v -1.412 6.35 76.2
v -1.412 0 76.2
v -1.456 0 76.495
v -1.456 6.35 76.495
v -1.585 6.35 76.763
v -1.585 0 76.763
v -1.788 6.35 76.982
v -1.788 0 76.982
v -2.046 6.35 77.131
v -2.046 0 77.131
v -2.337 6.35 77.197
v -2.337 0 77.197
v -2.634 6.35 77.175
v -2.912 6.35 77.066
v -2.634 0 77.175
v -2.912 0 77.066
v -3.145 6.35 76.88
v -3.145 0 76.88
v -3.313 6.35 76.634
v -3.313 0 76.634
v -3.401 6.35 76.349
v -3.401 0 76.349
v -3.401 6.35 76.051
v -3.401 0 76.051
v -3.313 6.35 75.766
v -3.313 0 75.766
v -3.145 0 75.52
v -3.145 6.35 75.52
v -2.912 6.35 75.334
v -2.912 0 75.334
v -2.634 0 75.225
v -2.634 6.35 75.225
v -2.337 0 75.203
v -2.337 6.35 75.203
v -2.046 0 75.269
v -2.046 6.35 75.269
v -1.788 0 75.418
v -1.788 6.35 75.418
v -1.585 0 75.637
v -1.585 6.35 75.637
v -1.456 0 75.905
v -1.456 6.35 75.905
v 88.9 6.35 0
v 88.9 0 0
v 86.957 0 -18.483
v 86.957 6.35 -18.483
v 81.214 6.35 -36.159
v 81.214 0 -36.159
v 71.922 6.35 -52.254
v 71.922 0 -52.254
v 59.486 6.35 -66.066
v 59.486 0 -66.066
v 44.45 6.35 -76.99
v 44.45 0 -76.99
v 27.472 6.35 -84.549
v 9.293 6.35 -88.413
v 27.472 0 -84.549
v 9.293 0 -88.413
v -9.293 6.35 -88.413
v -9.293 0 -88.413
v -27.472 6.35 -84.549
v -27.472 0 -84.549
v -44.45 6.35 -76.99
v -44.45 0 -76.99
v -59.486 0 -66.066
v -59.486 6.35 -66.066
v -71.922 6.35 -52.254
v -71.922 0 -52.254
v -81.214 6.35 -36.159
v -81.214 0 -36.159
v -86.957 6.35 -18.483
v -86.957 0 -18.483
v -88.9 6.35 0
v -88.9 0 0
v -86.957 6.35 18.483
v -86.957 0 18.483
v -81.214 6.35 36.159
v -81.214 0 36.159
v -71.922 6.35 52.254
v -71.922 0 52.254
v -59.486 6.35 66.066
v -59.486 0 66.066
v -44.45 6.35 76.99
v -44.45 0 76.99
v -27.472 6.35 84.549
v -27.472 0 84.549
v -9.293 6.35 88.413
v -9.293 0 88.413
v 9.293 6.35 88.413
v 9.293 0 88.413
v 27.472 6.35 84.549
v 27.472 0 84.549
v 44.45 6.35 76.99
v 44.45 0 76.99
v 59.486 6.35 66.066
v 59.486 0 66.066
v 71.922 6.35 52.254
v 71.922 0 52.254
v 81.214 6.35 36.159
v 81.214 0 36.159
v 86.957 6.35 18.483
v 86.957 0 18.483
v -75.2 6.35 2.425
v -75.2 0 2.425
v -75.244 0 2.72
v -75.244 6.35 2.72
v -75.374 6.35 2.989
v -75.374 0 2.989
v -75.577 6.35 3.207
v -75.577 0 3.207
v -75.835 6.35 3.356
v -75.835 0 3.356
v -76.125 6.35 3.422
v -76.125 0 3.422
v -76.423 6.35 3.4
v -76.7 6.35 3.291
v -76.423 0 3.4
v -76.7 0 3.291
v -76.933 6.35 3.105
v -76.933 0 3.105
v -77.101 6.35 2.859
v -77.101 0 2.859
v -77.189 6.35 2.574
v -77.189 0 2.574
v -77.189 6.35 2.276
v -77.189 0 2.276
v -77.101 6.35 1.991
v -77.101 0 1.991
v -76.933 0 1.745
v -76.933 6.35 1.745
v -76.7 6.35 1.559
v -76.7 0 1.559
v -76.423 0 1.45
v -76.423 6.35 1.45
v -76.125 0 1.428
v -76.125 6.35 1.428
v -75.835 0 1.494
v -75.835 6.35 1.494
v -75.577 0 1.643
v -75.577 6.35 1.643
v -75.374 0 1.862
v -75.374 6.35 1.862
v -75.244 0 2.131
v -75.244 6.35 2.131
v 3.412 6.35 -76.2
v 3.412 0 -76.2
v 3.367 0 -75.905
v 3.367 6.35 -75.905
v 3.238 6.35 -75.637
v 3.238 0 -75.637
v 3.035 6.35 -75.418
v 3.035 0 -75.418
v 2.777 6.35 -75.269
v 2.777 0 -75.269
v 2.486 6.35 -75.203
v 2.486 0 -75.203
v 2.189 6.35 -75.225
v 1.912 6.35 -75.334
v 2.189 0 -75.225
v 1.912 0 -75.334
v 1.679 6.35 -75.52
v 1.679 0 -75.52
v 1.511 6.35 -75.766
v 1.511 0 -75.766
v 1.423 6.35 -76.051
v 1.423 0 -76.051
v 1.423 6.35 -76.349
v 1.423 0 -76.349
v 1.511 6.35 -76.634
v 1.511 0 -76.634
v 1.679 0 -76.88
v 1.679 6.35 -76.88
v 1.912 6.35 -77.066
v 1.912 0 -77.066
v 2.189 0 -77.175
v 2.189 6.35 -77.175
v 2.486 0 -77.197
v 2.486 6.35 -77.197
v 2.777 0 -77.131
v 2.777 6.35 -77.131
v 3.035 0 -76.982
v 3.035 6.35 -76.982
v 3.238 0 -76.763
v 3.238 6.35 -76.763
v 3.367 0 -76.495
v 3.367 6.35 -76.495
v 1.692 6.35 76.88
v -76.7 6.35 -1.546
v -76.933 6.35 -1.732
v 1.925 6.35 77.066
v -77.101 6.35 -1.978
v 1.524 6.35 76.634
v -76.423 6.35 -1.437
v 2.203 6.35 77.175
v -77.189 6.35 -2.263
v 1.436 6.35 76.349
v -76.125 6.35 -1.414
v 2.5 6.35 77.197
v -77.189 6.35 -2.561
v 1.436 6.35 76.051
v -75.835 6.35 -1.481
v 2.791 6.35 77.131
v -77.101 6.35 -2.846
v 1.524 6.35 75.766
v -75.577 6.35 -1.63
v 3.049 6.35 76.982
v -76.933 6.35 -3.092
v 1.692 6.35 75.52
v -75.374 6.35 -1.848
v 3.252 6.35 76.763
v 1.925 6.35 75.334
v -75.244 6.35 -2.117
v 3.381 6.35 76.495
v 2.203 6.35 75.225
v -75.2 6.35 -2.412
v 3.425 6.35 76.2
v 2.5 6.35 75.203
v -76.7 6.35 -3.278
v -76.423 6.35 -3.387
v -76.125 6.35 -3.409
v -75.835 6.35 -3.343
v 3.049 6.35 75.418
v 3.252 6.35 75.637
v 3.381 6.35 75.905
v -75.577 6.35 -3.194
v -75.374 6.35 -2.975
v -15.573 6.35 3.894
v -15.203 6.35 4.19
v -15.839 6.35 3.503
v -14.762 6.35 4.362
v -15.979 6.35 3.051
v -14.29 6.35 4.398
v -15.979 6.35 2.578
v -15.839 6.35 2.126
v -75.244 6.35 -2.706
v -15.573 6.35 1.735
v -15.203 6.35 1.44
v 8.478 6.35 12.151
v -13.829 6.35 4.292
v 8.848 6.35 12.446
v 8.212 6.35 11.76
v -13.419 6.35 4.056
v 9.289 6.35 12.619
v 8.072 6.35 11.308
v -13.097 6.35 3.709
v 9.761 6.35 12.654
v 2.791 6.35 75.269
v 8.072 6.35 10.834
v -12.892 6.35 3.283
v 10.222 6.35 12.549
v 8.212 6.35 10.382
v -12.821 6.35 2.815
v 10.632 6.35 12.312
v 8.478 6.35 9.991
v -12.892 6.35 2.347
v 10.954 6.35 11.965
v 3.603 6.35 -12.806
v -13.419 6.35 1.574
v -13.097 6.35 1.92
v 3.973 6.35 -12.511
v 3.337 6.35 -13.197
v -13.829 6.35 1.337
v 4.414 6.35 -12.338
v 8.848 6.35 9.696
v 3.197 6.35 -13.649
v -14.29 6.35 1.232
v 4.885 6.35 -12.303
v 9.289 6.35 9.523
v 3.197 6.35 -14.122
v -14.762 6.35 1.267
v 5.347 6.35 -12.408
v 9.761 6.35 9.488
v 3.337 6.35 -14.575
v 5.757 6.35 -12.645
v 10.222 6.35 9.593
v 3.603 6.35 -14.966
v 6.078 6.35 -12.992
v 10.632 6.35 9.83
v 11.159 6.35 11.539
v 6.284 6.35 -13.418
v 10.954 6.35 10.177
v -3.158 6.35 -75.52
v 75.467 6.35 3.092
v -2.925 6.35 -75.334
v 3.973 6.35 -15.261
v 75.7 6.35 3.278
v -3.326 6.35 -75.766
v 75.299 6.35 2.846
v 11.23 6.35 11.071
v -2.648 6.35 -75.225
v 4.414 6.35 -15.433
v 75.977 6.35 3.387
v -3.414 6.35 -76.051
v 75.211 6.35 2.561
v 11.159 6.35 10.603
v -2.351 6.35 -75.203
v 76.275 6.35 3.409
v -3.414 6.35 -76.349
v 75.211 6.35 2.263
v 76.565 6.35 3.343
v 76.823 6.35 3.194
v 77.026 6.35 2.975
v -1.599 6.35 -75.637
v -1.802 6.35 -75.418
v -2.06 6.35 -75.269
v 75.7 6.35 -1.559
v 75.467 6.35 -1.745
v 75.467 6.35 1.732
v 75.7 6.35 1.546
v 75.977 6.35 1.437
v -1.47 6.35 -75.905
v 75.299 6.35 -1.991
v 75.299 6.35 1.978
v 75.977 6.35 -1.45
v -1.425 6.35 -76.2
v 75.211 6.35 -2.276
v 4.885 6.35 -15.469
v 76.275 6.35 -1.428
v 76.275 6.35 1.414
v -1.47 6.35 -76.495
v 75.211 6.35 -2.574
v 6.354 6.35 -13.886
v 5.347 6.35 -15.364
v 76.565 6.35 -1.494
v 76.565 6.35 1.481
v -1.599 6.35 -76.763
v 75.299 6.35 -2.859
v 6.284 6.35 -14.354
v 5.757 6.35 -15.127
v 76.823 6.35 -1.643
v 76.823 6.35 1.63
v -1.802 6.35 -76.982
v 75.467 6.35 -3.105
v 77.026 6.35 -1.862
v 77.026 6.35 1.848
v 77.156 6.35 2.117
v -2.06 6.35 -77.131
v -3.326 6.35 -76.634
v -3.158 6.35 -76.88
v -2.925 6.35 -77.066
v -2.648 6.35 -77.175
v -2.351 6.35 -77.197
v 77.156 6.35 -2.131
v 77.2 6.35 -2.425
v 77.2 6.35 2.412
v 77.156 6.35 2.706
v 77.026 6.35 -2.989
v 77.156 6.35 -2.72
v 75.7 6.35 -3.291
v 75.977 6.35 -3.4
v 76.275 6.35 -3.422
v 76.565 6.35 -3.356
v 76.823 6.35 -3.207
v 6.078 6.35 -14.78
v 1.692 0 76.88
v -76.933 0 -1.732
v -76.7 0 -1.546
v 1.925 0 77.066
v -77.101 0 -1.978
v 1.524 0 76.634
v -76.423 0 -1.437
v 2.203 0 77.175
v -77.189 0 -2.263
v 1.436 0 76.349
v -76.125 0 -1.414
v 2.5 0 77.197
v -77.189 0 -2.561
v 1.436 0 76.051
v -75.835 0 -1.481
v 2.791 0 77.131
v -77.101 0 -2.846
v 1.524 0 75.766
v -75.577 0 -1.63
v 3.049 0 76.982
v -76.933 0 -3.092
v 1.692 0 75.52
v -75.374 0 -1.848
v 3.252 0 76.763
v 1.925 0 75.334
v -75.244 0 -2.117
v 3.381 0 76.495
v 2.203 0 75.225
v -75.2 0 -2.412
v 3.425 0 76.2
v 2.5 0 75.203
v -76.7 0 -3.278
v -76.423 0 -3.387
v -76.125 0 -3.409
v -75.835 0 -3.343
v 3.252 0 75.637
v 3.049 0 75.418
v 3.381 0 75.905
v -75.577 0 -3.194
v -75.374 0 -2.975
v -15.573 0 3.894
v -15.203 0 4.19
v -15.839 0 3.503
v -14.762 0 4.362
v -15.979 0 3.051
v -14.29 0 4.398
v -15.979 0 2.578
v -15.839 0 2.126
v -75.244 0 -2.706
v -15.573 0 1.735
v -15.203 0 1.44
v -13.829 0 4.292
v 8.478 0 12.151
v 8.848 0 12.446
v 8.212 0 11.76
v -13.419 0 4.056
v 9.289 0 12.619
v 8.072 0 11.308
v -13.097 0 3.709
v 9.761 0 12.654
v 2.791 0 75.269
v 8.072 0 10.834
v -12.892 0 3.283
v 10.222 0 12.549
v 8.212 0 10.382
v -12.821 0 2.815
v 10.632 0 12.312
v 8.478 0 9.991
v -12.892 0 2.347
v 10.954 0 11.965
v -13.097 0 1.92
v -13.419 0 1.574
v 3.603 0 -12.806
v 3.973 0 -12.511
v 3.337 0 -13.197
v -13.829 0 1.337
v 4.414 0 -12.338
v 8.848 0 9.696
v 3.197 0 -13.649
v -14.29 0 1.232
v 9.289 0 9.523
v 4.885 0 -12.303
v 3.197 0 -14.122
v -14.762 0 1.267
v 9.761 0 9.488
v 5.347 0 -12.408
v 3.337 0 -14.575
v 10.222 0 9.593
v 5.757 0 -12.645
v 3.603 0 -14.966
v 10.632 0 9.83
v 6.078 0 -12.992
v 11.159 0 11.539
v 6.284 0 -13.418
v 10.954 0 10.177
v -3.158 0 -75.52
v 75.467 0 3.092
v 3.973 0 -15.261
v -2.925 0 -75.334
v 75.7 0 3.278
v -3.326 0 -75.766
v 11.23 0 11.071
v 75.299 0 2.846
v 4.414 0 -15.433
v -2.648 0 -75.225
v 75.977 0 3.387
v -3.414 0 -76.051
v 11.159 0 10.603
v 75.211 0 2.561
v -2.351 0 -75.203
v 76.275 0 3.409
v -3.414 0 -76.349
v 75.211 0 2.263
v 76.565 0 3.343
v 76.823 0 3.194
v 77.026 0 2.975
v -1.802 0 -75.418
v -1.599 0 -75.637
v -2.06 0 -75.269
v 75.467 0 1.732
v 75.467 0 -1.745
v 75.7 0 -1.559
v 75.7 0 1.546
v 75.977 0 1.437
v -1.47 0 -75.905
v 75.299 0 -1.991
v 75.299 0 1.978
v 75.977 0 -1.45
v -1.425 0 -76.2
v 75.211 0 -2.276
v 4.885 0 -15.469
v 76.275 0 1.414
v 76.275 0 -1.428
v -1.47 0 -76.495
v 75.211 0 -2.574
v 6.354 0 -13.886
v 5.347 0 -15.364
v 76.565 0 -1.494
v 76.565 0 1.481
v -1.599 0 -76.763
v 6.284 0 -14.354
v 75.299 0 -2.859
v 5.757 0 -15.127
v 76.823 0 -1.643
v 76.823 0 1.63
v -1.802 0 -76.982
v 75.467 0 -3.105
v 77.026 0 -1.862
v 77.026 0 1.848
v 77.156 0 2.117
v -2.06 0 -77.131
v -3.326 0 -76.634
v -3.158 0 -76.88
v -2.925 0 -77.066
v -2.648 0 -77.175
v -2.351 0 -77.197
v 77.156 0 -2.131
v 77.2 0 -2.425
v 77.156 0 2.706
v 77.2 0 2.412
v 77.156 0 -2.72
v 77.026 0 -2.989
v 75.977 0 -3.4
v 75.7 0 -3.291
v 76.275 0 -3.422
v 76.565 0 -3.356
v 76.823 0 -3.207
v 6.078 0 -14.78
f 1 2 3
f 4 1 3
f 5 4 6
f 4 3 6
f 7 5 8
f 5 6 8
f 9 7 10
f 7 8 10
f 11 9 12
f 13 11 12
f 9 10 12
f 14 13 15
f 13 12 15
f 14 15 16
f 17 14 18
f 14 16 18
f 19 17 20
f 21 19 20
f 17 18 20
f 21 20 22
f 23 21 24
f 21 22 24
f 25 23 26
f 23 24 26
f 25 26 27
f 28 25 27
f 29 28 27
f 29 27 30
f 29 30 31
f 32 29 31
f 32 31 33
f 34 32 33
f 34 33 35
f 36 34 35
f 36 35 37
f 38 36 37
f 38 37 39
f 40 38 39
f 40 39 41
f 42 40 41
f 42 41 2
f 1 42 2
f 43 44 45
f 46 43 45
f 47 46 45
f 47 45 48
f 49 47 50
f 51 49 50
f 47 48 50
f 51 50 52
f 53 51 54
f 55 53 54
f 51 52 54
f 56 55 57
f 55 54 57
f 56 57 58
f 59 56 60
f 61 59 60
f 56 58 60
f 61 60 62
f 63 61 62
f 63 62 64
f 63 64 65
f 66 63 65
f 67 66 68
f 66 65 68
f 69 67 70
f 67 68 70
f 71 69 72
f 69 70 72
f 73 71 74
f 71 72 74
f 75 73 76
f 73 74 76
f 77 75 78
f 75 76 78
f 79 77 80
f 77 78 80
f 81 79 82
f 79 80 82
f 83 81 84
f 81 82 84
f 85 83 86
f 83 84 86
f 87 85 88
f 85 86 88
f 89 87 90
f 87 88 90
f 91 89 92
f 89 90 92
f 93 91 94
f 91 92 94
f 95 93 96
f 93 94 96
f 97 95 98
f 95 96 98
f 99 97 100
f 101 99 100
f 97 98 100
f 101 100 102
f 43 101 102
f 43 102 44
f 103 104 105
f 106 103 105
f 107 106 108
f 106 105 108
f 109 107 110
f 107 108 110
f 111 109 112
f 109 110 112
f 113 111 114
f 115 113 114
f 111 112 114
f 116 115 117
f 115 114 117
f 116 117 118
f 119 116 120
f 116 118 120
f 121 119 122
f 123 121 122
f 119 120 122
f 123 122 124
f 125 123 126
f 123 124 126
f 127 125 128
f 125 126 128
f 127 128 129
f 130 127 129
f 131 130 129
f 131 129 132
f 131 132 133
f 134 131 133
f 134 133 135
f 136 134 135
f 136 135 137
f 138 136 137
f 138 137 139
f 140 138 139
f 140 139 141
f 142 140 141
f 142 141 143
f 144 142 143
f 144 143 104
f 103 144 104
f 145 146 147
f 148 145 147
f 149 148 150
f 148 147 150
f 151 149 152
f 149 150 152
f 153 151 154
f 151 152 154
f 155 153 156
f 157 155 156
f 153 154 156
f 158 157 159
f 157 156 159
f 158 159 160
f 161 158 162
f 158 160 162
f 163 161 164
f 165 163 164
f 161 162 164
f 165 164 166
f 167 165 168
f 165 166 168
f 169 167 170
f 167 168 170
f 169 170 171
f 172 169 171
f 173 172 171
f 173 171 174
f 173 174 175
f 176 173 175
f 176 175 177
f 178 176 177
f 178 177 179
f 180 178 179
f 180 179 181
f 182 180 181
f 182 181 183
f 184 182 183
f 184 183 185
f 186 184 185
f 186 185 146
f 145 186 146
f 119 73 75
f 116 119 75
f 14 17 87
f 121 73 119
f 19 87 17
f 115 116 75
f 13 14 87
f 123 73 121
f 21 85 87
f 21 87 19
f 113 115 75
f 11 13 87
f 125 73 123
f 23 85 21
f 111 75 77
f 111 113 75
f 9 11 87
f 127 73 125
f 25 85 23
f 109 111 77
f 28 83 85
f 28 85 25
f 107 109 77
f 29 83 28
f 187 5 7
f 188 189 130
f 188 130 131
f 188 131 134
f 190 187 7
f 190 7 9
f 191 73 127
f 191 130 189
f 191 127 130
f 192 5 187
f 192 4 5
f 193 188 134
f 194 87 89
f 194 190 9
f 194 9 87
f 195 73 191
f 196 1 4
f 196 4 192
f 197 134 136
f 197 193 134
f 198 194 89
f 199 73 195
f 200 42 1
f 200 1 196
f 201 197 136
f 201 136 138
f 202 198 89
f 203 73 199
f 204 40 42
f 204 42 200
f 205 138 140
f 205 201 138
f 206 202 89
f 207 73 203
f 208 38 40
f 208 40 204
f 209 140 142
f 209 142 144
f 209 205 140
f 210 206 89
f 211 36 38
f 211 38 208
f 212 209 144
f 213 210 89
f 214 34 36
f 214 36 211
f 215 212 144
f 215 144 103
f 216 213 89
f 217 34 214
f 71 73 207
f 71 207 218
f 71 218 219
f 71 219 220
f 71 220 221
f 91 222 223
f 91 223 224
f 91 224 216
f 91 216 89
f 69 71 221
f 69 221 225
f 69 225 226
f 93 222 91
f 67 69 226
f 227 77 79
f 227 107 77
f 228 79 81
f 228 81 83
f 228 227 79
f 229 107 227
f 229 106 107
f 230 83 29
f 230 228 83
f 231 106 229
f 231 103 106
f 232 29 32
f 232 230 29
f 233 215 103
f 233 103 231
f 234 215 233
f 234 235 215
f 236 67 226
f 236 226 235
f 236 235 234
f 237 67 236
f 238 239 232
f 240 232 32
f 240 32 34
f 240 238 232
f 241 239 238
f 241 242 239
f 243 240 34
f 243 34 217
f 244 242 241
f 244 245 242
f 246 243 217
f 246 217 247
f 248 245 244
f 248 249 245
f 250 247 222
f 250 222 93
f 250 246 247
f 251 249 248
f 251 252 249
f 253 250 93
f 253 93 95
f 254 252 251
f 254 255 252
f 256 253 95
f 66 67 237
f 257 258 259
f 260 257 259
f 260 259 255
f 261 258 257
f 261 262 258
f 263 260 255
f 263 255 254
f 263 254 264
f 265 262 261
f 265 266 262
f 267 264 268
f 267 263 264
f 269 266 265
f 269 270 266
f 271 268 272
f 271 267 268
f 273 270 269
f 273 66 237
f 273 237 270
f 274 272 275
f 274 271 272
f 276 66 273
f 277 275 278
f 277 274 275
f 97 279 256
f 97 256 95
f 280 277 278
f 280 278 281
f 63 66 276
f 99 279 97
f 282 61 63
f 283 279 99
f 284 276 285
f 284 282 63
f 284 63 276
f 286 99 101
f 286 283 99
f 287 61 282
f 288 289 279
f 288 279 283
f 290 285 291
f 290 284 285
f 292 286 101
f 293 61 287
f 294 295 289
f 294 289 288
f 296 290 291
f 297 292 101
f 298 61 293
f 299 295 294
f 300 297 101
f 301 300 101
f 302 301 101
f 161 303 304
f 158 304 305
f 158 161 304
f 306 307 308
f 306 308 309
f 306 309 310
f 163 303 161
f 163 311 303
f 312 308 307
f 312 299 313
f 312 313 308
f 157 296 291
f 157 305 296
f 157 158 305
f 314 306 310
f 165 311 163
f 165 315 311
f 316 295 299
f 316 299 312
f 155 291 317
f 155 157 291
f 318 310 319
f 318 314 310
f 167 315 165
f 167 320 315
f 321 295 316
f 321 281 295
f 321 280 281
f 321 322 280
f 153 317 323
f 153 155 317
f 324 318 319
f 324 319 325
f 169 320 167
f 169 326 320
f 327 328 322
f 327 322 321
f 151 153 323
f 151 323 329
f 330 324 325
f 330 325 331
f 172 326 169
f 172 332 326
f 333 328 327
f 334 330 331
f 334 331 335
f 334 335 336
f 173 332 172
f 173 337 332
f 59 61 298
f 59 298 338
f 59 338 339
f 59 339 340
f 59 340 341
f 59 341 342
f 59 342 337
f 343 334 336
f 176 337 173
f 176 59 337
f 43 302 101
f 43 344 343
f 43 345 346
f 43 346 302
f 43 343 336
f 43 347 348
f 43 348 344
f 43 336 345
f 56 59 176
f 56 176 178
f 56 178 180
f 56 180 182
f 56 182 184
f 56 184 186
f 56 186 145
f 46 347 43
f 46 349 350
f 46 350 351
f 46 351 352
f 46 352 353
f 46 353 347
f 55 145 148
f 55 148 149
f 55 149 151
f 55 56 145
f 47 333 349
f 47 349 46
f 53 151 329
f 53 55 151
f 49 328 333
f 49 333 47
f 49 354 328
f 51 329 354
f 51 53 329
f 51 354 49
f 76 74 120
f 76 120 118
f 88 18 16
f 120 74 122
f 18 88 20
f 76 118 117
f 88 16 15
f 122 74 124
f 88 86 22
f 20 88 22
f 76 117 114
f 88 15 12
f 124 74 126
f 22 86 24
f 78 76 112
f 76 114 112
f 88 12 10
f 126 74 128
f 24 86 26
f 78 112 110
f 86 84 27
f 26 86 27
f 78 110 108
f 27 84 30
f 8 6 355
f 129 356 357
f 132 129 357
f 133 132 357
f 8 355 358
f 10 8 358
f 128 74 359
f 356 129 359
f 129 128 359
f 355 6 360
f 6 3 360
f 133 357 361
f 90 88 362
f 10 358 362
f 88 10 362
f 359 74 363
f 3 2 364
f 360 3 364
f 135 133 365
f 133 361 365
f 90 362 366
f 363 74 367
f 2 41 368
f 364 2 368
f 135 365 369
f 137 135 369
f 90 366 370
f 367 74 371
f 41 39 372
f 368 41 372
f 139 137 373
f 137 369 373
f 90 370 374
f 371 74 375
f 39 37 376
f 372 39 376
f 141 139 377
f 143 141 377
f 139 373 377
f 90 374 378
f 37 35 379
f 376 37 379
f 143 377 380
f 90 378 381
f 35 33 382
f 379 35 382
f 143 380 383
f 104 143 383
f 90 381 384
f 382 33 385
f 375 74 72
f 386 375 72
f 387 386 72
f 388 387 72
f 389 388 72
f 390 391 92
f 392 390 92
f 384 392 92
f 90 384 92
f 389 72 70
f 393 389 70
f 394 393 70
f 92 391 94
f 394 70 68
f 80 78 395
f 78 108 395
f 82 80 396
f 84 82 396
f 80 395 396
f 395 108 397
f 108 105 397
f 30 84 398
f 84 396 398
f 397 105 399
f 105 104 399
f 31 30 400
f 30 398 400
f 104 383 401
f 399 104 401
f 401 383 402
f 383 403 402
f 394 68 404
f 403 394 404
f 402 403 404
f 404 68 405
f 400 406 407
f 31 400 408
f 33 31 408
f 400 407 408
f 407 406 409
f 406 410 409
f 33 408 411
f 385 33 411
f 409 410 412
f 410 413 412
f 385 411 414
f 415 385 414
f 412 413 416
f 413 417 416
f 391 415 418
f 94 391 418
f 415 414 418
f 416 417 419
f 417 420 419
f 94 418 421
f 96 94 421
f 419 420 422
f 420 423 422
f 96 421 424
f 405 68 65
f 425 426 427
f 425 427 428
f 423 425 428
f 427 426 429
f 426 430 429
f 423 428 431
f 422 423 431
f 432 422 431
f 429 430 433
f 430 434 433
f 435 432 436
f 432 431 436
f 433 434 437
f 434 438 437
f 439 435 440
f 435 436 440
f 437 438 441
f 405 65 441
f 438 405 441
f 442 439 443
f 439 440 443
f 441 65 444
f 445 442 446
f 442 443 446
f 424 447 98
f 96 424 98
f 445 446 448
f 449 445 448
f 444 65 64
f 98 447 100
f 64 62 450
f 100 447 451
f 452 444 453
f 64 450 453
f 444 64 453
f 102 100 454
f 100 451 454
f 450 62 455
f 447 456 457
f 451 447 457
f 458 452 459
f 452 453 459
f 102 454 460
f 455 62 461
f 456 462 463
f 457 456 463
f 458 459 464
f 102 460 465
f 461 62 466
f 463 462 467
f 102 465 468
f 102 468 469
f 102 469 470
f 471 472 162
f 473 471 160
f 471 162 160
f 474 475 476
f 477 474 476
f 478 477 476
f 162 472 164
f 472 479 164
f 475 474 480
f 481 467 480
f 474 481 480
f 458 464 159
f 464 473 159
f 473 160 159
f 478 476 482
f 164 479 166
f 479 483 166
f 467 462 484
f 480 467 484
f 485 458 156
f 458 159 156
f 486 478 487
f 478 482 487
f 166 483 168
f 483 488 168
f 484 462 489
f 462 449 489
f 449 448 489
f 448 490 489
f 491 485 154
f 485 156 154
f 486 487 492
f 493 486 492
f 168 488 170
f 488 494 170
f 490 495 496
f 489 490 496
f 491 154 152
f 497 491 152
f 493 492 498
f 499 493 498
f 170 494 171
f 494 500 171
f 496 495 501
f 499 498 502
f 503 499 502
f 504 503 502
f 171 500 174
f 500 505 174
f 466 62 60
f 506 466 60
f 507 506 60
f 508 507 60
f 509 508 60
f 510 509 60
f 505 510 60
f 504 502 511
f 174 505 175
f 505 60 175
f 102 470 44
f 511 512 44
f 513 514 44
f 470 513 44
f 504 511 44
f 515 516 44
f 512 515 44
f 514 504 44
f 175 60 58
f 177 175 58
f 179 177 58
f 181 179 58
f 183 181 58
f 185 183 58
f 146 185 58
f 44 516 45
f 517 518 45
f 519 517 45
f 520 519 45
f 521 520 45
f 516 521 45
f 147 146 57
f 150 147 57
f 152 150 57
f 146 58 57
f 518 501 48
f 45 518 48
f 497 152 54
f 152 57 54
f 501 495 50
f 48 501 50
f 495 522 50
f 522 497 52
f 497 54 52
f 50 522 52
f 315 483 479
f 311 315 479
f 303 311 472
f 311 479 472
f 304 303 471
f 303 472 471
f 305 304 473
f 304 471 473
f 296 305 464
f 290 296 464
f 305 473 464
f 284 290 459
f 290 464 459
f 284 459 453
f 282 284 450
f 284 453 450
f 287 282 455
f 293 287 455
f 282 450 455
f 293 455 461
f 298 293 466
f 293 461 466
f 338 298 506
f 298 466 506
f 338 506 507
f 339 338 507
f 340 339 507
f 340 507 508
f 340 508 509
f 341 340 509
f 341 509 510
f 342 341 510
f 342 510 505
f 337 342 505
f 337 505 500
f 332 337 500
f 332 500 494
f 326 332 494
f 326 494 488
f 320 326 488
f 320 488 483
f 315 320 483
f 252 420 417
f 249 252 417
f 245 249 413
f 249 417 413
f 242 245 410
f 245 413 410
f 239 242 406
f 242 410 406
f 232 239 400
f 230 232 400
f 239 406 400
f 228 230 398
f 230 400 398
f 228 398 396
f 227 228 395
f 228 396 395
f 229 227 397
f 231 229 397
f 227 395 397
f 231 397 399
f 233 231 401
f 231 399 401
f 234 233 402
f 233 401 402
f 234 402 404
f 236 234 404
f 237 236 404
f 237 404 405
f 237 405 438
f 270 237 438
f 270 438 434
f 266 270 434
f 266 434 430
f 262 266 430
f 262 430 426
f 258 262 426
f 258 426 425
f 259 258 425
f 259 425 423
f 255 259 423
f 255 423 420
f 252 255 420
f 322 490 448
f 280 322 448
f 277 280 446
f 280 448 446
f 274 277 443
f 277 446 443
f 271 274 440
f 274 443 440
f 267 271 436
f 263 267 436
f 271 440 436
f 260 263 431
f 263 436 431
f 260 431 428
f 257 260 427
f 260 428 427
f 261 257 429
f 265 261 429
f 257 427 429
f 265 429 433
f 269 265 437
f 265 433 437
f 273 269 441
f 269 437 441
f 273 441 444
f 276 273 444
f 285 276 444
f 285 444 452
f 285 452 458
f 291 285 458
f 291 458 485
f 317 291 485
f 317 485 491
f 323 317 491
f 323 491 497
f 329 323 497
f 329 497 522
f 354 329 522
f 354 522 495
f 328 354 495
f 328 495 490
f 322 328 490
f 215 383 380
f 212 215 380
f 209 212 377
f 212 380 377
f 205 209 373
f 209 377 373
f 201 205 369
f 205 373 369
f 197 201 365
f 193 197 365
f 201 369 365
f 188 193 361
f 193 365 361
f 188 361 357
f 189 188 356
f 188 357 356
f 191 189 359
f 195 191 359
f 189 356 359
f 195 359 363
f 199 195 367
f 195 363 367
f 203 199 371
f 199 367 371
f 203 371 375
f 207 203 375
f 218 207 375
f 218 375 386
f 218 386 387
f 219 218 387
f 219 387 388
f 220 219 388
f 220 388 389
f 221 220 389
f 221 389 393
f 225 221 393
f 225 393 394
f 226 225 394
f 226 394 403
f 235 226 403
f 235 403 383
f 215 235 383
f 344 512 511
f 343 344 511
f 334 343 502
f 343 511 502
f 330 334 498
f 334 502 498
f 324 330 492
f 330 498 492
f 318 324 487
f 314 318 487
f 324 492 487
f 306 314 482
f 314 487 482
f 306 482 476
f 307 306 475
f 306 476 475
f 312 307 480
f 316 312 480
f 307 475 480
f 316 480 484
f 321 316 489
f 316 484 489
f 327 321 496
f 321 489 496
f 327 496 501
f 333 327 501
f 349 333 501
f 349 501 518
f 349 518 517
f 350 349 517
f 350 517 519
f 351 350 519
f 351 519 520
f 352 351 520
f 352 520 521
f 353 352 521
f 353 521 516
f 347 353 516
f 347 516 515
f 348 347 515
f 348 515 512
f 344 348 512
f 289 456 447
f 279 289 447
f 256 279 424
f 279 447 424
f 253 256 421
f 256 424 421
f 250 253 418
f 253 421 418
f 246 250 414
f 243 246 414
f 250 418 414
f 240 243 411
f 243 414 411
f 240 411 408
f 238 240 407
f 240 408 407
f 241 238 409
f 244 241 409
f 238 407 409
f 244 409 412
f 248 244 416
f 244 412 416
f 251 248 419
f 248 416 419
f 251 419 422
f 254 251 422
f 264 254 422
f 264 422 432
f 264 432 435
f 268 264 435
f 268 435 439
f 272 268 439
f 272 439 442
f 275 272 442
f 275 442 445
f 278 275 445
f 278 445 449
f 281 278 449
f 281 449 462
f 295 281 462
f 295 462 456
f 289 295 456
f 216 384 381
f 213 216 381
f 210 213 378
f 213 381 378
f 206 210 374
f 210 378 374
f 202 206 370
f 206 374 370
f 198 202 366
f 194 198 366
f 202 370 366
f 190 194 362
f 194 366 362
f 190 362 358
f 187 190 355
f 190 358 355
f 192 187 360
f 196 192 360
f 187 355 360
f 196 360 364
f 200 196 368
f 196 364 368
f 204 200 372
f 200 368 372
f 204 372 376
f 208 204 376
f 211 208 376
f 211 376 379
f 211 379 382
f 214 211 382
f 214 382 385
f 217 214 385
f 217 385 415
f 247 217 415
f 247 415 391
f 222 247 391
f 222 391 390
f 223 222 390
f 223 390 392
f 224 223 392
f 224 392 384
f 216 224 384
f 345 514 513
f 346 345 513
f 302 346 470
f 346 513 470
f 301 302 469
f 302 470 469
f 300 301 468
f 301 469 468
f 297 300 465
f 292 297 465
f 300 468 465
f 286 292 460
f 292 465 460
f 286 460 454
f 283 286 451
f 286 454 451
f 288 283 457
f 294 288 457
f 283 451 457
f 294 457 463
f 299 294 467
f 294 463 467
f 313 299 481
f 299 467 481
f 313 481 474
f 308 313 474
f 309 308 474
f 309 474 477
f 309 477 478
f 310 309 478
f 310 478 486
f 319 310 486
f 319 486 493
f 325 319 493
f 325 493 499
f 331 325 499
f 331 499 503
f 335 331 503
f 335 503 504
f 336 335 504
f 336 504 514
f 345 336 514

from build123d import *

# Parameters (mm, degrees)
SKETCH1_R           = 88.9
BOSS_EXTRUDE1_DEPTH = 6.35
CUT_EXTRUDE1_REACH  = 8.35
SKETCH2_R           = 1
CUT_EXTRUDE2_REACH  = 8.35
SKETCH4_R           = 1.5875


with BuildPart() as part:
    # Sketch1 → Boss-Extrude1 (new body)
    with BuildSketch(Plane(origin=(0, 0, 0), x_dir=(1, 0, 0), z_dir=(0, 1, 0))):
        Circle(SKETCH1_R)
    extrude(amount=BOSS_EXTRUDE1_DEPTH)

    # Sketch2 → Cut-Extrude1 (cut, up to next)
    with BuildSketch(Plane.XZ, mode=Mode.PRIVATE) as cut_extrude1_sk1:
        with Locations((2.411677935, -76.2)):
            Circle(SKETCH2_R)
    cut_extrude1_tool1 = extrude(cut_extrude1_sk1.sketch, amount=-CUT_EXTRUDE1_REACH, mode=Mode.PRIVATE) & part.part
    add(cut_extrude1_tool1.solids().sort_by_distance((2.411678, 0, -76.2))[0], mode=Mode.SUBTRACT)
    # Sketch2 → Cut-Extrude1 (cut, up to next)
    with BuildSketch(Plane.XZ, mode=Mode.PRIVATE) as cut_extrude1_sk2:
        with Locations((-2.425285476, -76.2)):
            Circle(SKETCH2_R)
    cut_extrude1_tool2 = extrude(cut_extrude1_sk2.sketch, amount=-CUT_EXTRUDE1_REACH, mode=Mode.PRIVATE) & part.part
    add(cut_extrude1_tool2.solids().sort_by_distance((-2.425285, 0, -76.2))[0], mode=Mode.SUBTRACT)
    # Sketch2 → Cut-Extrude1 (cut, up to next)
    with BuildSketch(Plane.XZ, mode=Mode.PRIVATE) as cut_extrude1_sk3:
        with Locations((-76.2, -2.411677935)):
            Circle(SKETCH2_R)
    cut_extrude1_tool3 = extrude(cut_extrude1_sk3.sketch, amount=-CUT_EXTRUDE1_REACH, mode=Mode.PRIVATE) & part.part
    add(cut_extrude1_tool3.solids().sort_by_distance((-76.2, 0, -2.411678))[0], mode=Mode.SUBTRACT)
    # Sketch2 → Cut-Extrude1 (cut, up to next)
    with BuildSketch(Plane.XZ, mode=Mode.PRIVATE) as cut_extrude1_sk4:
        with Locations((-76.2, 2.425285476)):
            Circle(SKETCH2_R)
    cut_extrude1_tool4 = extrude(cut_extrude1_sk4.sketch, amount=-CUT_EXTRUDE1_REACH, mode=Mode.PRIVATE) & part.part
    add(cut_extrude1_tool4.solids().sort_by_distance((-76.2, 0, 2.425285))[0], mode=Mode.SUBTRACT)
    # Sketch2 → Cut-Extrude1 (cut, up to next)
    with BuildSketch(Plane.XZ, mode=Mode.PRIVATE) as cut_extrude1_sk5:
        with Locations((-2.411677935, 76.2)):
            Circle(SKETCH2_R)
    cut_extrude1_tool5 = extrude(cut_extrude1_sk5.sketch, amount=-CUT_EXTRUDE1_REACH, mode=Mode.PRIVATE) & part.part
    add(cut_extrude1_tool5.solids().sort_by_distance((-2.411678, 0, 76.2))[0], mode=Mode.SUBTRACT)
    # Sketch2 → Cut-Extrude1 (cut, up to next)
    with BuildSketch(Plane.XZ, mode=Mode.PRIVATE) as cut_extrude1_sk6:
        with Locations((2.425285476, 76.2)):
            Circle(SKETCH2_R)
    cut_extrude1_tool6 = extrude(cut_extrude1_sk6.sketch, amount=-CUT_EXTRUDE1_REACH, mode=Mode.PRIVATE) & part.part
    add(cut_extrude1_tool6.solids().sort_by_distance((2.425285, 0, 76.2))[0], mode=Mode.SUBTRACT)
    # Sketch2 → Cut-Extrude1 (cut, up to next)
    with BuildSketch(Plane.XZ, mode=Mode.PRIVATE) as cut_extrude1_sk7:
        with Locations((76.2, 2.411677935)):
            Circle(SKETCH2_R)
    cut_extrude1_tool7 = extrude(cut_extrude1_sk7.sketch, amount=-CUT_EXTRUDE1_REACH, mode=Mode.PRIVATE) & part.part
    add(cut_extrude1_tool7.solids().sort_by_distance((76.2, 0, 2.411678))[0], mode=Mode.SUBTRACT)
    # Sketch2 → Cut-Extrude1 (cut, up to next)
    with BuildSketch(Plane.XZ, mode=Mode.PRIVATE) as cut_extrude1_sk8:
        with Locations((76.2, -2.425285476)):
            Circle(SKETCH2_R)
    cut_extrude1_tool8 = extrude(cut_extrude1_sk8.sketch, amount=-CUT_EXTRUDE1_REACH, mode=Mode.PRIVATE) & part.part
    add(cut_extrude1_tool8.solids().sort_by_distance((76.2, 0, -2.425285))[0], mode=Mode.SUBTRACT)

    # Sketch4 → Cut-Extrude2 (cut, up to next)
    with BuildSketch(Plane.XZ, mode=Mode.PRIVATE) as cut_extrude2_sk1:
        with Locations((4.766839139, -13.885779707)):
            Circle(SKETCH4_R)
    cut_extrude2_tool1 = extrude(cut_extrude2_sk1.sketch, amount=-CUT_EXTRUDE2_REACH, mode=Mode.PRIVATE) & part.part
    add(cut_extrude2_tool1.solids().sort_by_distance((4.766839, 0, -13.88578))[0], mode=Mode.SUBTRACT)
    # Sketch4 → Cut-Extrude2 (cut, up to next)
    with BuildSketch(Plane.XZ, mode=Mode.PRIVATE) as cut_extrude2_sk2:
        with Locations((-14.408857547, 2.814686063)):
            Circle(SKETCH4_R)
    cut_extrude2_tool2 = extrude(cut_extrude2_sk2.sketch, amount=-CUT_EXTRUDE2_REACH, mode=Mode.PRIVATE) & part.part
    add(cut_extrude2_tool2.solids().sort_by_distance((-14.408858, 0, 2.814686))[0], mode=Mode.SUBTRACT)
    # Sketch4 → Cut-Extrude2 (cut, up to next)
    with BuildSketch(Plane.XZ, mode=Mode.PRIVATE) as cut_extrude2_sk3:
        with Locations((9.642018407, 11.071093644)):
            Circle(SKETCH4_R)
    cut_extrude2_tool3 = extrude(cut_extrude2_sk3.sketch, amount=-CUT_EXTRUDE2_REACH, mode=Mode.PRIVATE) & part.part
    add(cut_extrude2_tool3.solids().sort_by_distance((9.642018, 0, 11.071094))[0], mode=Mode.SUBTRACT)


solid = part.part
